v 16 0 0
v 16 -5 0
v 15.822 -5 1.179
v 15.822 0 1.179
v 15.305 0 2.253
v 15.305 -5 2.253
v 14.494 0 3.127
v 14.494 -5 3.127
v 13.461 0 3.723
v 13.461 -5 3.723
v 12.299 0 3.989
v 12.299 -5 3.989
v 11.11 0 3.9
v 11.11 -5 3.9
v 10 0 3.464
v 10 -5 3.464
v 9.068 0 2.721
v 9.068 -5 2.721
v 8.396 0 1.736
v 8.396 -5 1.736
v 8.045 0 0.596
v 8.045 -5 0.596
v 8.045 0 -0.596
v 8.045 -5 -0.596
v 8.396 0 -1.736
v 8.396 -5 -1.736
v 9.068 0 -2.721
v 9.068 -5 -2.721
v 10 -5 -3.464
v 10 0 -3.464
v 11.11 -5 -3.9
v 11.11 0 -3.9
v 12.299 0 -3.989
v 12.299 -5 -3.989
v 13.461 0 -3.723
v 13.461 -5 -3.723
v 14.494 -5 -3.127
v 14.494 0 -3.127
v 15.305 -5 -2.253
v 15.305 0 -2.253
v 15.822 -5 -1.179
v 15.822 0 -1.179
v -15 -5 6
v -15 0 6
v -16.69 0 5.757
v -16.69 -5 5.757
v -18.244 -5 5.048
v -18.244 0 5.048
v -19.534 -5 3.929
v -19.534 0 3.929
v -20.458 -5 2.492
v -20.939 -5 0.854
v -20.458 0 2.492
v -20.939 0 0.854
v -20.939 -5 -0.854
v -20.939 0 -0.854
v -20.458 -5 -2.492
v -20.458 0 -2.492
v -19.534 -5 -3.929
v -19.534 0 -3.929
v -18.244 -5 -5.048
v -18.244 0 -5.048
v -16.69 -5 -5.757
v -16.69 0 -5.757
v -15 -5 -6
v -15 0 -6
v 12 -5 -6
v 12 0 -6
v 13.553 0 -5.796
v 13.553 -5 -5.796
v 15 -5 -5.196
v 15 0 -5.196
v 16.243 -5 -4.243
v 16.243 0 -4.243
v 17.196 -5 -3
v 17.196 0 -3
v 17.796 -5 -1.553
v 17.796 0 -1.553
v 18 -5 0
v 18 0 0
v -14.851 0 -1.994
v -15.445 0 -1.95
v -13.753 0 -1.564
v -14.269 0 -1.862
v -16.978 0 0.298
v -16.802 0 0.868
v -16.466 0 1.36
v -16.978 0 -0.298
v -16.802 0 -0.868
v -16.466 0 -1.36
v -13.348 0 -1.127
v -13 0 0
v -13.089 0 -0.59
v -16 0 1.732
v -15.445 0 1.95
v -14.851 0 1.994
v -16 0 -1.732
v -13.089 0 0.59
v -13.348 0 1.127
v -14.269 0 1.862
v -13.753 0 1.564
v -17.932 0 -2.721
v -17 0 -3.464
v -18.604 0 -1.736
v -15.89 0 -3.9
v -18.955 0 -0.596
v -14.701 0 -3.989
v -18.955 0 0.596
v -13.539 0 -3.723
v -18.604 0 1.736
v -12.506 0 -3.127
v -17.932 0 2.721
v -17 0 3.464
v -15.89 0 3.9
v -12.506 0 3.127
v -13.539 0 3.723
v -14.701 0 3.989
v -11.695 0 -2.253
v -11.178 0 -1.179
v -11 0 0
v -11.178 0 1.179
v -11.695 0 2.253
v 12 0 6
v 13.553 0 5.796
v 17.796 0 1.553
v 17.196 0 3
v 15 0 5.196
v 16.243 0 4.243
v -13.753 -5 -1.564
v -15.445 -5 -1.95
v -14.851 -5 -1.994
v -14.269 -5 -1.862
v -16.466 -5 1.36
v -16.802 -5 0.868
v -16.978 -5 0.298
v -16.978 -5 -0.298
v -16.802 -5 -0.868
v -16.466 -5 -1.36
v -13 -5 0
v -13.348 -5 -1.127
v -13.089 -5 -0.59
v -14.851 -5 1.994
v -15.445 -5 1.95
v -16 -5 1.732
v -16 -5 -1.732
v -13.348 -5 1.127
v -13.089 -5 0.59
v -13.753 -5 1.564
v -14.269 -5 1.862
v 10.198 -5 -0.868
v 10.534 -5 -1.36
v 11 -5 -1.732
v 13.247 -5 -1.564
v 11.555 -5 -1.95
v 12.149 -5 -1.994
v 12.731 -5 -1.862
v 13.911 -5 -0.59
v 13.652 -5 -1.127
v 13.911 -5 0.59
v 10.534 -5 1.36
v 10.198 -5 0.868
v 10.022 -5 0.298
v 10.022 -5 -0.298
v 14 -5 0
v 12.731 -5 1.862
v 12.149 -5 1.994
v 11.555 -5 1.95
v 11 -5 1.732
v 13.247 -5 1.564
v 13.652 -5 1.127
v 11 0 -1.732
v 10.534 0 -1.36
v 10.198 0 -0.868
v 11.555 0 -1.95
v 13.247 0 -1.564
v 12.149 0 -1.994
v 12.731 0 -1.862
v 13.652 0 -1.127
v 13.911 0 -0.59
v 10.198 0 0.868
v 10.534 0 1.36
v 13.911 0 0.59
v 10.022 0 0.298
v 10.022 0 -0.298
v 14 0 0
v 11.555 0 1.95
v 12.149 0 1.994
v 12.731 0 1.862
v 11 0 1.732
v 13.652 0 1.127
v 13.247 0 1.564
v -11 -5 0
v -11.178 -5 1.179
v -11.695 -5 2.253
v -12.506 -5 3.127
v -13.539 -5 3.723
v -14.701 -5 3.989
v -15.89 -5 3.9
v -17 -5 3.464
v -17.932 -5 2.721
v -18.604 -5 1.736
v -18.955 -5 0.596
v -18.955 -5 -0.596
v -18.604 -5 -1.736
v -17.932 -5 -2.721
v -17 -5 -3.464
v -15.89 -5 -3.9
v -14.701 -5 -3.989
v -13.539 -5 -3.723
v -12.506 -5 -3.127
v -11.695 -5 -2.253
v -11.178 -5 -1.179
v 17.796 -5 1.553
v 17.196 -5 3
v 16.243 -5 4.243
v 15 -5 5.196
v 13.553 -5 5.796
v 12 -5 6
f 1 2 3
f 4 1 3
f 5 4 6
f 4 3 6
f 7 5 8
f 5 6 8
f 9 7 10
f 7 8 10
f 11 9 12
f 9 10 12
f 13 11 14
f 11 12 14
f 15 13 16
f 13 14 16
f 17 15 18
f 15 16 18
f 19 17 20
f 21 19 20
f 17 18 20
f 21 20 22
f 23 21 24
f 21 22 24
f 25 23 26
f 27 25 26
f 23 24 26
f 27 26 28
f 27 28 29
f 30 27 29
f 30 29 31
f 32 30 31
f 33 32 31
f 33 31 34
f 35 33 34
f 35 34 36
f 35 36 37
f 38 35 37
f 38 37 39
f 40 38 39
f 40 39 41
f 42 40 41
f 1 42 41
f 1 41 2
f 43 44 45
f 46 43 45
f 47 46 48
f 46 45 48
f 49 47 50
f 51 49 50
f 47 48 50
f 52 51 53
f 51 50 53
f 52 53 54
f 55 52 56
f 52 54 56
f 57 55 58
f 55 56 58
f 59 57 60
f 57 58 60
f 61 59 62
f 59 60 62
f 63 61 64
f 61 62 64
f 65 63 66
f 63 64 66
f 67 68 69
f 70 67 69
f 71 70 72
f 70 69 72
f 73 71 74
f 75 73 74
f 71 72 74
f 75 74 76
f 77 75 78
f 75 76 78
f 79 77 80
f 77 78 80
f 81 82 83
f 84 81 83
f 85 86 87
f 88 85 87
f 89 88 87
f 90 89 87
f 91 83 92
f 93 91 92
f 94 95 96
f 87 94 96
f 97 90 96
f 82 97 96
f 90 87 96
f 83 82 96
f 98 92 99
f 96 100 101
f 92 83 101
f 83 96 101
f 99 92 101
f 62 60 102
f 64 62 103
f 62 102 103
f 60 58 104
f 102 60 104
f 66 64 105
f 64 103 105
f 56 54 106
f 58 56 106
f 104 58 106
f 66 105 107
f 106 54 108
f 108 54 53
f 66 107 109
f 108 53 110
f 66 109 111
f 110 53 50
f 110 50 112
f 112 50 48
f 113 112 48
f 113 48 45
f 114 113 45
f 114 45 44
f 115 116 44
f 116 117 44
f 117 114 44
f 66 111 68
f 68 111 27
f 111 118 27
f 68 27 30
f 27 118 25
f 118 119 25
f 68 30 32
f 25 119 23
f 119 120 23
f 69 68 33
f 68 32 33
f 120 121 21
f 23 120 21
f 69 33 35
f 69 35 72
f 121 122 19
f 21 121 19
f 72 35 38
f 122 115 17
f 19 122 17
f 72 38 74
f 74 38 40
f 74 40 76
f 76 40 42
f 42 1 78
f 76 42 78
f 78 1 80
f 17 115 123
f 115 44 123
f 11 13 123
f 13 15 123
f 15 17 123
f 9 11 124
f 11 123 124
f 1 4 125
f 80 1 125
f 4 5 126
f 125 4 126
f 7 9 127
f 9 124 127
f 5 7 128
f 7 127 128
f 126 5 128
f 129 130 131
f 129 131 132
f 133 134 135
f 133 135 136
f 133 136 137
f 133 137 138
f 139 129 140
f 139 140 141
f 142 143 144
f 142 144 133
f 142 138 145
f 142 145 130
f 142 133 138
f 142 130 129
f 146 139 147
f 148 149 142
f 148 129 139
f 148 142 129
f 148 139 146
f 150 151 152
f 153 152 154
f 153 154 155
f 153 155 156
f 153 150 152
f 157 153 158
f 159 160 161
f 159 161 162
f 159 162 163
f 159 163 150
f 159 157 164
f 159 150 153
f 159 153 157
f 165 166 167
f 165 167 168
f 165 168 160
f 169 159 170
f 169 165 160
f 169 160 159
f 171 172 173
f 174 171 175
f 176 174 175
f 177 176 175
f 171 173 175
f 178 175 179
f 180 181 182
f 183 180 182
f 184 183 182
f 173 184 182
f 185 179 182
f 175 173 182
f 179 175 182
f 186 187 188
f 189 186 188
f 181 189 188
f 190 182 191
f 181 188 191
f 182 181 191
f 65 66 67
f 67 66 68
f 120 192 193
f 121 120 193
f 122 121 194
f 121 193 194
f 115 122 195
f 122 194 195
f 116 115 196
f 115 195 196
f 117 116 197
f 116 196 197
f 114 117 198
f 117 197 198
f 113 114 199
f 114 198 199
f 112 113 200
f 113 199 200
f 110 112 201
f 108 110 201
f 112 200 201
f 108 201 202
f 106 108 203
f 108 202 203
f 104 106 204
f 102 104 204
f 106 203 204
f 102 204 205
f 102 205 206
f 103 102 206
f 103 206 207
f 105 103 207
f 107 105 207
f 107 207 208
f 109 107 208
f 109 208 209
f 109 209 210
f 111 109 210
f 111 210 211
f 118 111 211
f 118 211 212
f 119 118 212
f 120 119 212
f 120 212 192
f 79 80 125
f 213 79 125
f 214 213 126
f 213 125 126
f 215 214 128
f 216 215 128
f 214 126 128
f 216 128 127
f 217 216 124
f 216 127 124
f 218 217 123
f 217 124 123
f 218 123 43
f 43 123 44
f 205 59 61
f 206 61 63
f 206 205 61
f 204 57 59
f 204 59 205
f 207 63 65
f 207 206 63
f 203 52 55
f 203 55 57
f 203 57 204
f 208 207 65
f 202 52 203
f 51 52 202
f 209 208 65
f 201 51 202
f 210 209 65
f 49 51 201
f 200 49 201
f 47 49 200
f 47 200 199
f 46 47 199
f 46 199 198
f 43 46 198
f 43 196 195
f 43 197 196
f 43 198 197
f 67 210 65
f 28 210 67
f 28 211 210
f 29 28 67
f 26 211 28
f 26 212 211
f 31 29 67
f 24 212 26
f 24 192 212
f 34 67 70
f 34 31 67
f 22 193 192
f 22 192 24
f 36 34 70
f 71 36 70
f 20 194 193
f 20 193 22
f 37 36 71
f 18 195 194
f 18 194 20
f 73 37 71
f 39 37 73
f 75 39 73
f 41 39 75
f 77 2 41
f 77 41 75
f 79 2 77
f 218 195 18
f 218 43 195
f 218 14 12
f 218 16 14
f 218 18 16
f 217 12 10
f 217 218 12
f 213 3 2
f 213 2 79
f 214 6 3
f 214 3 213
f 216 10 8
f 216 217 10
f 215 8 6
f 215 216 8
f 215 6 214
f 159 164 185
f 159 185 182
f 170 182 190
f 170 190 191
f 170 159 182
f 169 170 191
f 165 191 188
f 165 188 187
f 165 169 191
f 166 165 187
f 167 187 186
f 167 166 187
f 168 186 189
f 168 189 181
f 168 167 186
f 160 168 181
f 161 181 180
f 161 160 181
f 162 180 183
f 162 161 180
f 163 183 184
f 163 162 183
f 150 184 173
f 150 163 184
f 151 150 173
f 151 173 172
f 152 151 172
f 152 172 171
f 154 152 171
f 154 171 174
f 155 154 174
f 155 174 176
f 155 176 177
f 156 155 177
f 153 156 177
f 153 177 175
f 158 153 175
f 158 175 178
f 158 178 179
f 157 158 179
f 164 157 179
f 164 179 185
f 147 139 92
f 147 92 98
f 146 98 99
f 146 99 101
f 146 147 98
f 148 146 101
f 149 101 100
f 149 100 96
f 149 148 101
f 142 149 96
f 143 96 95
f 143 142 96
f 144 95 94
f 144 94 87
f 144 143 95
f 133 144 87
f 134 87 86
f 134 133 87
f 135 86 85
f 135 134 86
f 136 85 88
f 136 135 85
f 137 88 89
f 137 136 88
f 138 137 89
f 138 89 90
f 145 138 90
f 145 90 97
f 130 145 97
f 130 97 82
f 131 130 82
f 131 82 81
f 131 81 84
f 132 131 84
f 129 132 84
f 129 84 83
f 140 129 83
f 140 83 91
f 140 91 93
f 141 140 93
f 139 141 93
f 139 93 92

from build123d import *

# Parameters (mm, degrees)
F1_DEPTH = 5
F2_R     = 4
F2_R_2   = 2
F3_DEPTH = 25


with BuildPart() as f1:
    # F0 (on Front) → F1 (new body)
    with BuildSketch(Plane.XZ):
        with BuildLine():
            ThreePointArc((-15, -6), (-10.757359, -4.242641), (-9, 0))
            ThreePointArc((-9, 0), (-10.757359, 4.242641), (-15, 6))
            ThreePointArc((-15, 6), (-21, 0), (-15, -6))
        make_face()
        with BuildLine():
            ThreePointArc((-15, 6), (-10.757359, 4.242641), (-9, 0))
            ThreePointArc((-9, 0), (-10.757359, -4.242641), (-15, -6))
            Line((-15, -6), (12, -6))
            ThreePointArc((12, -6), (6, 0), (12, 6))
            Line((12, 6), (-15, 6))
        make_face()
        with BuildLine():
            ThreePointArc((18, 0), (16.242641, 4.242641), (12, 6))
            ThreePointArc((12, 6), (6, 0), (12, -6))
            ThreePointArc((12, -6), (16.242641, -4.242641), (18, 0))
        make_face()
    extrude(amount=F1_DEPTH)

    # F2 (on face) → F3 (cut)
    with BuildSketch(Plane.XZ.offset(5)):
        with Locations((-15, 0)):
            Circle(F2_R)
        with Locations((-15, 0)):
            Circle(F2_R_2, mode=Mode.SUBTRACT)
        with Locations((12, 0)):
            Circle(F2_R)
        with Locations((12, 0)):
            Circle(F2_R_2, mode=Mode.SUBTRACT)
    extrude(amount=-F3_DEPTH, mode=Mode.SUBTRACT)


solid = f1.part
